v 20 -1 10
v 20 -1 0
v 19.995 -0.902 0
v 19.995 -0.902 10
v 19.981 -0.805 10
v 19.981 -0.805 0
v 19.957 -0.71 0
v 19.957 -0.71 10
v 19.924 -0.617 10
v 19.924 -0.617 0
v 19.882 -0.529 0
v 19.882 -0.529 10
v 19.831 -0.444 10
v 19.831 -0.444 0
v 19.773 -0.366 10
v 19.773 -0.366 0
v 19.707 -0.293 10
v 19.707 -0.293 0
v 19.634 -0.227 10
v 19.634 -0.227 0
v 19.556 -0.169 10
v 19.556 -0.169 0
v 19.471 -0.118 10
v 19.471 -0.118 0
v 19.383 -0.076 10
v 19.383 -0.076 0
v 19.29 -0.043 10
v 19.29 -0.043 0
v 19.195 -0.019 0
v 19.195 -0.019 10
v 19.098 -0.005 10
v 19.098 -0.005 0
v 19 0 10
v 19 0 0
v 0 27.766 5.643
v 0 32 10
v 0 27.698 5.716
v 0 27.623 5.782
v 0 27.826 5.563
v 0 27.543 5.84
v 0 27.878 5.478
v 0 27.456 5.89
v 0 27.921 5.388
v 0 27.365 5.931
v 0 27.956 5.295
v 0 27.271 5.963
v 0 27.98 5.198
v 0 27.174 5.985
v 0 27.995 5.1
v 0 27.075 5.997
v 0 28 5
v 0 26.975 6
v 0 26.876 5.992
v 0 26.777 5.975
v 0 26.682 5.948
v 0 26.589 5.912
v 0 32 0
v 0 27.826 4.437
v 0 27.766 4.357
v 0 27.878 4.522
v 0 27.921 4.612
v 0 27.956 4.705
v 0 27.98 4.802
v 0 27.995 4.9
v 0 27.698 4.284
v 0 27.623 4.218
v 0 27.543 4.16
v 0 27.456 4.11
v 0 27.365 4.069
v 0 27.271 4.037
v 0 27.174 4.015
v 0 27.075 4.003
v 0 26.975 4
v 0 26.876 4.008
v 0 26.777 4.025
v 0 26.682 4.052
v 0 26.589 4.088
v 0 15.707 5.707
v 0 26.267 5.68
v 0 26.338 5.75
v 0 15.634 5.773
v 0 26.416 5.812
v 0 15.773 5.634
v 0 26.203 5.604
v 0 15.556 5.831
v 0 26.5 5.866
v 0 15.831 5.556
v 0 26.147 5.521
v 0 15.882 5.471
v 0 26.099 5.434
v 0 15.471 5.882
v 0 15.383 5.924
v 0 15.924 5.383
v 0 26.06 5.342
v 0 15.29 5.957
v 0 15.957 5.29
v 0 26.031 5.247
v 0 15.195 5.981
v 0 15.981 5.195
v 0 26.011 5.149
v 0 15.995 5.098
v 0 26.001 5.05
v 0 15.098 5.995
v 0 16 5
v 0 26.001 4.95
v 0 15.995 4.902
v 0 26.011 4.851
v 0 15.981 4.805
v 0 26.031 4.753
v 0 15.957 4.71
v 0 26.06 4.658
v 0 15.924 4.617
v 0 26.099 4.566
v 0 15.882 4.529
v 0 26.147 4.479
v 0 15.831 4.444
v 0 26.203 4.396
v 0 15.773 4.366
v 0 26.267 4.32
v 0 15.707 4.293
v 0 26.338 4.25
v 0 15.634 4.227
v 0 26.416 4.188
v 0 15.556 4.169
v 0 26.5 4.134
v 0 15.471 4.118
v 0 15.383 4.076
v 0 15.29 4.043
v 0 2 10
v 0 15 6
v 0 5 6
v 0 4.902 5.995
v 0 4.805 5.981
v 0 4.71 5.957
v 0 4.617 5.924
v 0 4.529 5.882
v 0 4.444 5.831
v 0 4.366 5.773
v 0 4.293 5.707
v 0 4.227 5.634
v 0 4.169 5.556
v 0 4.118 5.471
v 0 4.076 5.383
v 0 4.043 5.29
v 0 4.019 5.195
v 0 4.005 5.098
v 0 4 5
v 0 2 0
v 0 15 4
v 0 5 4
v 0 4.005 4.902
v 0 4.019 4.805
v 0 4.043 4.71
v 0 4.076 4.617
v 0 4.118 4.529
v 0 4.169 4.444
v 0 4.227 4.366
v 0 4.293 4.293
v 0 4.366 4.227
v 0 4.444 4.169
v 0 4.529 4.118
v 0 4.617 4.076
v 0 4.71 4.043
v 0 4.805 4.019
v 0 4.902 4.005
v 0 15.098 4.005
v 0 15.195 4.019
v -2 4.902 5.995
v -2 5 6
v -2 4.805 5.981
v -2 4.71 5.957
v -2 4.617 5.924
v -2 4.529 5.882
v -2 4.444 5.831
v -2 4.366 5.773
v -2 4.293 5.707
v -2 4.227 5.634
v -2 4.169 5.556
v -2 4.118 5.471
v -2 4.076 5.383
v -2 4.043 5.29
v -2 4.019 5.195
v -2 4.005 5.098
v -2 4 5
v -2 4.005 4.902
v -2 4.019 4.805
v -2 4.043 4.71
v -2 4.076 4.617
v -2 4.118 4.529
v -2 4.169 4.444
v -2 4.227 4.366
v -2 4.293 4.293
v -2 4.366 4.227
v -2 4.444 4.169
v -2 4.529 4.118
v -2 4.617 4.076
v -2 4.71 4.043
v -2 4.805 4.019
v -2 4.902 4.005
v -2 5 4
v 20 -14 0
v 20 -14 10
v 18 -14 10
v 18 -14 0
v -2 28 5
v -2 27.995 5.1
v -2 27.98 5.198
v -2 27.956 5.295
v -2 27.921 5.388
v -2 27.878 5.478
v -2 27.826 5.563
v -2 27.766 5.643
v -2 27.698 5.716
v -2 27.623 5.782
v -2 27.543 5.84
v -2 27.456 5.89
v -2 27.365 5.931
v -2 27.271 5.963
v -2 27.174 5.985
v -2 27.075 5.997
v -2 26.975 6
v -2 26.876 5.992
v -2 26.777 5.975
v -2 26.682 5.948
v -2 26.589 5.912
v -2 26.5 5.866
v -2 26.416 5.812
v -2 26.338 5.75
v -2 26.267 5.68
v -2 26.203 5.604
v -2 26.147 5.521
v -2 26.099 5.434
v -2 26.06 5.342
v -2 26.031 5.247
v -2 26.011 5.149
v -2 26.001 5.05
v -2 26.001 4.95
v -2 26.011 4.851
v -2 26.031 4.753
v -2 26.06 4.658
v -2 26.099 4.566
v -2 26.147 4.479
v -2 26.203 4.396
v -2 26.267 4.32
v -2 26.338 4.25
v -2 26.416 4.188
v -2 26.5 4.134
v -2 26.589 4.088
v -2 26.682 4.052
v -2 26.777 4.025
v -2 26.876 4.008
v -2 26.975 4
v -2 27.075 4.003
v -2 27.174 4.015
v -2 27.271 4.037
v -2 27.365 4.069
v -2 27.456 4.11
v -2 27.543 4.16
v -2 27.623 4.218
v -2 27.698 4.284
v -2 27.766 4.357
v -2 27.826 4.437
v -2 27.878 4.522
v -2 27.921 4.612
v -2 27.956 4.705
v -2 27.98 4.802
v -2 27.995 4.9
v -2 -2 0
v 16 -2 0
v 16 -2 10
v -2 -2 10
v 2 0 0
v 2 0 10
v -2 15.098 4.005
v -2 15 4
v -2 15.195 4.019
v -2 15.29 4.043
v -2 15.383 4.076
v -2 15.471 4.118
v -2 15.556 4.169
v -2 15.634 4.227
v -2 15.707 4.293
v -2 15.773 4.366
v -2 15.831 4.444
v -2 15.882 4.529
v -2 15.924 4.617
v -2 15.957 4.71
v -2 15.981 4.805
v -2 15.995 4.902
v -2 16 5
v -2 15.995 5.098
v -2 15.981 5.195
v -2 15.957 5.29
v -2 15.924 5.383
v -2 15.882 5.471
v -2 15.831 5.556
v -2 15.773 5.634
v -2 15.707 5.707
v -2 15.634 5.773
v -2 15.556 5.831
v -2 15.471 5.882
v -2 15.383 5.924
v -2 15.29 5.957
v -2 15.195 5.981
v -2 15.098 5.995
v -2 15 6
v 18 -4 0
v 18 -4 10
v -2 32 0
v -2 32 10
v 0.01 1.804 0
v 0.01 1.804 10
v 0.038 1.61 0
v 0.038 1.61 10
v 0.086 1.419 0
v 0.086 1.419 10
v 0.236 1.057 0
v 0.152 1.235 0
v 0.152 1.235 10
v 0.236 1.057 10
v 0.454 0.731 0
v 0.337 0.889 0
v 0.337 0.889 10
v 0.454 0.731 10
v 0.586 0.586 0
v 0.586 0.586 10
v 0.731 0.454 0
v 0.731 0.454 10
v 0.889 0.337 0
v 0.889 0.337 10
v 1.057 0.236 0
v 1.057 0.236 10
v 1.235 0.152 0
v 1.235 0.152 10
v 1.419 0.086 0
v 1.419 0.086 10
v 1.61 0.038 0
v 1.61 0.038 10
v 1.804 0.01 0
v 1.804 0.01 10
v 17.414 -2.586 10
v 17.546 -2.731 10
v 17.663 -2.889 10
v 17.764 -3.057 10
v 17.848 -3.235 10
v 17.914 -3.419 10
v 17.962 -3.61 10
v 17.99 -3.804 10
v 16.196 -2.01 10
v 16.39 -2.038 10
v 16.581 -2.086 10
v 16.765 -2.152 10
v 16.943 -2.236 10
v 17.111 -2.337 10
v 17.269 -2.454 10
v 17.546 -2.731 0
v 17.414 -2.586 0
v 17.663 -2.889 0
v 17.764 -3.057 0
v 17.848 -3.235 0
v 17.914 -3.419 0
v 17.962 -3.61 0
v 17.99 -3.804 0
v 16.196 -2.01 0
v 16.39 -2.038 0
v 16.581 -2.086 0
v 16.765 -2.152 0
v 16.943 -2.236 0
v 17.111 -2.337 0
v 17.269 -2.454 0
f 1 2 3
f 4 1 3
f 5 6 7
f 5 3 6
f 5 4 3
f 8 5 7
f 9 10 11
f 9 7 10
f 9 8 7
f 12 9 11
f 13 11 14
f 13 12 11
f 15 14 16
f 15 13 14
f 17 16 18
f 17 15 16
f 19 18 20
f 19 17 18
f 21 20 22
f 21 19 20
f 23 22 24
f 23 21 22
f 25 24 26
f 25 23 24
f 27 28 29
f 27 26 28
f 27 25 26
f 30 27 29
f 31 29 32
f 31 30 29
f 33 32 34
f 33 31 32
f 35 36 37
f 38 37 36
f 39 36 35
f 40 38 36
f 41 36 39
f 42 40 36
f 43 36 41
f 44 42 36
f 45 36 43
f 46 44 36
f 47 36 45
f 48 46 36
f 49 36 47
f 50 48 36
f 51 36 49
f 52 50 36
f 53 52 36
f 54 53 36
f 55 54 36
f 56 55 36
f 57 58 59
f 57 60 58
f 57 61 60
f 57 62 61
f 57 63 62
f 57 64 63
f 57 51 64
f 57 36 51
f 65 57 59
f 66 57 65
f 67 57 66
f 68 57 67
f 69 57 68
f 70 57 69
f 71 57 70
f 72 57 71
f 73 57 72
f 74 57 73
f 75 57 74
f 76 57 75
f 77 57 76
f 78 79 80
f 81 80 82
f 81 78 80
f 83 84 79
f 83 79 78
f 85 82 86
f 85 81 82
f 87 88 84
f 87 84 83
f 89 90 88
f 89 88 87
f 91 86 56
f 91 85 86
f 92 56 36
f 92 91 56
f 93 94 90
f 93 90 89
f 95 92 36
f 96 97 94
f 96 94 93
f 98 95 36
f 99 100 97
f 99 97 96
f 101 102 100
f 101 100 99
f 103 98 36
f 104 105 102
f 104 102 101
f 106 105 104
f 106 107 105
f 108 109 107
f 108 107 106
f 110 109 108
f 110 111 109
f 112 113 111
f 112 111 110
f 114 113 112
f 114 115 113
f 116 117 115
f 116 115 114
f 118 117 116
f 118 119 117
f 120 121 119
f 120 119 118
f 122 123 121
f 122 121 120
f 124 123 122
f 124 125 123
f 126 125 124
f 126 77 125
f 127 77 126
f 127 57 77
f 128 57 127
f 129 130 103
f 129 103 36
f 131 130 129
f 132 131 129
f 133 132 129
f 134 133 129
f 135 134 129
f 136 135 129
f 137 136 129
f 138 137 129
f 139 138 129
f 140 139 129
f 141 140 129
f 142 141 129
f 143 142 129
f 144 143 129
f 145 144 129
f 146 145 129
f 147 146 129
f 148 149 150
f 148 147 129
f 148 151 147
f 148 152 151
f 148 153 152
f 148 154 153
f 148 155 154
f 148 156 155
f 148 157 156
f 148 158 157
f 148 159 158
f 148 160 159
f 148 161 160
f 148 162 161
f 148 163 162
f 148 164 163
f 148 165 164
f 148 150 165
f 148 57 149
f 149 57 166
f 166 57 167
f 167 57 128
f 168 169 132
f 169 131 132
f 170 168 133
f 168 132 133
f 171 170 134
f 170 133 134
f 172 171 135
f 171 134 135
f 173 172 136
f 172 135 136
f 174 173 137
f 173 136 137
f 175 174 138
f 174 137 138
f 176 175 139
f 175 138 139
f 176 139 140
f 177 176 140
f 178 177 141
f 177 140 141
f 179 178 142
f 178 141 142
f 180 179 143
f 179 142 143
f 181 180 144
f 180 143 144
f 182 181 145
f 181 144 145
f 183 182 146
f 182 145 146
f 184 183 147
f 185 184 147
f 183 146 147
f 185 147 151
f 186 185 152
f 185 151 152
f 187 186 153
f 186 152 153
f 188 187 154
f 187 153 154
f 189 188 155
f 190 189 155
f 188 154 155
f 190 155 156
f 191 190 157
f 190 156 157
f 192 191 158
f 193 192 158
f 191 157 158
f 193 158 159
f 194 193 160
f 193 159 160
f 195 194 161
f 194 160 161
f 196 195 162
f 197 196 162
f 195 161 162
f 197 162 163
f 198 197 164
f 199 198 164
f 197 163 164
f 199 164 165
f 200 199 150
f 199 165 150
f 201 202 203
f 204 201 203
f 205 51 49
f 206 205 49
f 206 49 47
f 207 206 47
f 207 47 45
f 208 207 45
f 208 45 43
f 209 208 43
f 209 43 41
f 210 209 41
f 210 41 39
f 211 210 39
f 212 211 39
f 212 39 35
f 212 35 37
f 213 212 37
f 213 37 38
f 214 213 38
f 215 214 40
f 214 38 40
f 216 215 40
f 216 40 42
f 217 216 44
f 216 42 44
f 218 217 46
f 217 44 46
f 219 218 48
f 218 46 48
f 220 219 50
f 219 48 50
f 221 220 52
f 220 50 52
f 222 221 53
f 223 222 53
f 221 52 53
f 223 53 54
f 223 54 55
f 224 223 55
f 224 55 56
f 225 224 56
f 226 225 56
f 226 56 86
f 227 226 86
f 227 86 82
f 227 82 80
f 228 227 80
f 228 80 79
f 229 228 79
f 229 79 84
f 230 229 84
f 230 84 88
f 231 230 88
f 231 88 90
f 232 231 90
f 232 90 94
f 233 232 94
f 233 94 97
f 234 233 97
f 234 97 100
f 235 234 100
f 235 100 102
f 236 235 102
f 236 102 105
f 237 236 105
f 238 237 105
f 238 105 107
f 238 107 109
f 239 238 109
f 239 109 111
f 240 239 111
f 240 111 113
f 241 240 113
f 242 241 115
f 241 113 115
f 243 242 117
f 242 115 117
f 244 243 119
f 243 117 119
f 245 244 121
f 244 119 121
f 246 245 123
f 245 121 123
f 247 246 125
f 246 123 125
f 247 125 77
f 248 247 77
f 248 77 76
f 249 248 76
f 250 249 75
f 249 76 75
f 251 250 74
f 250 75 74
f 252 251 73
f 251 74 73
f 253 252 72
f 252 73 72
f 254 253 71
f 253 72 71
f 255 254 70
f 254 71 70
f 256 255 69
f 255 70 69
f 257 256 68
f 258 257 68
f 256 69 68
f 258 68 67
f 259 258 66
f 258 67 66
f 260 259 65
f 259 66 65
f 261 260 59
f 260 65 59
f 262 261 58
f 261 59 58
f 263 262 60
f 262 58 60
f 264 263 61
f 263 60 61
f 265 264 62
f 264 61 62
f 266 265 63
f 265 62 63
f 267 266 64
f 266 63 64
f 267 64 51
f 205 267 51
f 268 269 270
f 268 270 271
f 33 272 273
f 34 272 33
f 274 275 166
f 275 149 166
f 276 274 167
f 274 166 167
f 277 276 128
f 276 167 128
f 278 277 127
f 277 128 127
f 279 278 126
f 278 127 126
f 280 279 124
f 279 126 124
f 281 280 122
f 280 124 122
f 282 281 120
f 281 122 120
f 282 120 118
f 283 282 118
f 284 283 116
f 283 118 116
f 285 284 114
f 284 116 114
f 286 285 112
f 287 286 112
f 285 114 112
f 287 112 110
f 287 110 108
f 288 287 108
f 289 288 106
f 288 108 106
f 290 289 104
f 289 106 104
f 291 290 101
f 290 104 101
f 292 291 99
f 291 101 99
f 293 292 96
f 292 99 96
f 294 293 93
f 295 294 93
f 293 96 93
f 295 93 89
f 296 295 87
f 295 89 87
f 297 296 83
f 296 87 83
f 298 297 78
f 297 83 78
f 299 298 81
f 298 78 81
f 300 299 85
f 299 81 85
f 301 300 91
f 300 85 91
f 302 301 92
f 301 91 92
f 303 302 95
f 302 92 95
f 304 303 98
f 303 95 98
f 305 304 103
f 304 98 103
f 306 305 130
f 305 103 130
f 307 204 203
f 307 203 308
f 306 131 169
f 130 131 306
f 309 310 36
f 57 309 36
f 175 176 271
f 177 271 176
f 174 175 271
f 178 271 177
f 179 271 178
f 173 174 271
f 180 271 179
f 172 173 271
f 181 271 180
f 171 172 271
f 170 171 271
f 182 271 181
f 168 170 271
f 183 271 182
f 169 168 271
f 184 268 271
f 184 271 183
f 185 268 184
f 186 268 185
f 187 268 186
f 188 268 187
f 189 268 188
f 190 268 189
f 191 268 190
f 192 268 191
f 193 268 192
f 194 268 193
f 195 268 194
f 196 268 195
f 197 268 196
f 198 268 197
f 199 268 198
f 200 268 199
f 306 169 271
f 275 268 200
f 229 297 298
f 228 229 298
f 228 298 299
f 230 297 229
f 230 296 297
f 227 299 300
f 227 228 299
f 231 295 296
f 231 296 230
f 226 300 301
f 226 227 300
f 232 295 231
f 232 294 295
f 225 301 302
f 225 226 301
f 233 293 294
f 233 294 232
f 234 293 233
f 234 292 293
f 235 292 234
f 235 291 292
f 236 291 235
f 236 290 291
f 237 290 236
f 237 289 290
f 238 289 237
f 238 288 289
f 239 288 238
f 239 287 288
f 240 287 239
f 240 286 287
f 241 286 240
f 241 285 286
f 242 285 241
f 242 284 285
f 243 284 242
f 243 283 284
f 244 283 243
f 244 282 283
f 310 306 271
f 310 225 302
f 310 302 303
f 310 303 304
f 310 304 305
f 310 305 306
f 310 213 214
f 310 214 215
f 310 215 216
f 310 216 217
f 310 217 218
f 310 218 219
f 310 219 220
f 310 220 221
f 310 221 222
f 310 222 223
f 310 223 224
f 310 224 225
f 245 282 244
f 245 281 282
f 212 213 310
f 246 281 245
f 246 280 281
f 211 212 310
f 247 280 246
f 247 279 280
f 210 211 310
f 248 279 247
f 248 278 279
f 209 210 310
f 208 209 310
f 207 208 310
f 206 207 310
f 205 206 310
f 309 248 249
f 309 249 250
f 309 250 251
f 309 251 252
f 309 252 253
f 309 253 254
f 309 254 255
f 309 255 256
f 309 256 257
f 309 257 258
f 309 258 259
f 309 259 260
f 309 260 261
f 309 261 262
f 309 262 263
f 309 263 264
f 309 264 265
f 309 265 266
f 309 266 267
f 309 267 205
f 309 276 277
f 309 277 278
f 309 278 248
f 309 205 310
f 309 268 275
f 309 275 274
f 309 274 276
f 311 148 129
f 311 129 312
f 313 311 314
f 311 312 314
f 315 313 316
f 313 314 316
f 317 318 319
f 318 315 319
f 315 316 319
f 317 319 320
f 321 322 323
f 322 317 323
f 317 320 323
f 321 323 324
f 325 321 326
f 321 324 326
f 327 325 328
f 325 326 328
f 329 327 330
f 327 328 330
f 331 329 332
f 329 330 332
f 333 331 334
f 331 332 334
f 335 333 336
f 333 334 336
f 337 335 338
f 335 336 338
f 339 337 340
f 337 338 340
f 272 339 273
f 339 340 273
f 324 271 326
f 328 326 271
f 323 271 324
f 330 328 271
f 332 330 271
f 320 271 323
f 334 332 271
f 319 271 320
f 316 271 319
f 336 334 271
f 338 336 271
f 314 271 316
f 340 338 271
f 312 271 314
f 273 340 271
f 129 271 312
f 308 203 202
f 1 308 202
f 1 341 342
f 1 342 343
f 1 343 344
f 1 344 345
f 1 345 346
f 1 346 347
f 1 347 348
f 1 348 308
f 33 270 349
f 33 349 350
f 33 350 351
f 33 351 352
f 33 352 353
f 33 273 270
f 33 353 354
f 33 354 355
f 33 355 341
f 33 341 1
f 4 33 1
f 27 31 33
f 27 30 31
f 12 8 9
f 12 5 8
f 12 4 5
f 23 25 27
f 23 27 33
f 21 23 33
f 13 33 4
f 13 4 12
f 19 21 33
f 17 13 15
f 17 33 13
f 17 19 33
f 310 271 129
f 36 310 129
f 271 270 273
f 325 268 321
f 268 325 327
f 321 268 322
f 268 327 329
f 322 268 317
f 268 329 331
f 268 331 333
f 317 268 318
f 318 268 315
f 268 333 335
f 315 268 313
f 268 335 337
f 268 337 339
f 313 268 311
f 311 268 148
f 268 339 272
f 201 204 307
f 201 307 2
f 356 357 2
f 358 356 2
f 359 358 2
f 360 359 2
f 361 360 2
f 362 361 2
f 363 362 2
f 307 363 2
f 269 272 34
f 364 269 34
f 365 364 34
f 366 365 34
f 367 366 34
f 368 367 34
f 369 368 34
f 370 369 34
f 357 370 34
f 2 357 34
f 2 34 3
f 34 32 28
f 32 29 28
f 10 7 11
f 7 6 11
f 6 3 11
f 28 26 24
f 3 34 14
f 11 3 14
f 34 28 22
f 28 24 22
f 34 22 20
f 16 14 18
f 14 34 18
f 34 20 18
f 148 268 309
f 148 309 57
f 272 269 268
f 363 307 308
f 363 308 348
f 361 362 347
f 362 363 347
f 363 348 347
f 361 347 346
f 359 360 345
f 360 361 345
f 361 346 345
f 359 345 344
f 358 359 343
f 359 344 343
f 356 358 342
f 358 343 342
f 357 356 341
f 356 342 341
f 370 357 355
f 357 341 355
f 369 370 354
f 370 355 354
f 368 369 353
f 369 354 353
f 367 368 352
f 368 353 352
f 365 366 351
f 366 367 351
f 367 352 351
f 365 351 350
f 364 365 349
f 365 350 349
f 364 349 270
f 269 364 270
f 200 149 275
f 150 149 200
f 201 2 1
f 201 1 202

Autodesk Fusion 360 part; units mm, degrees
sketch "Sketch2" plane through (0, 0, 0) normal (0, 0, 1) x (1, 0, 0)
  line L0 (0, 0) -> (-2, 0)
  line L1 (-2, 0) -> (-2, 32)
  line L2 (-2, 32) -> (0, 32)
  line L3 (0, 32) -> (0, 0)
  line L4 (-2, 0) -> (18, 0)
  line L5 (18, 0) -> (18, -2)
  line L6 (18, -2) -> (-2, -2)
  line L7 (-2, -2) -> (-2, 0)
  line L8 (18, 0) -> (20, 0)
  line L9 (20, 0) -> (20, -14)
  line L10 (20, -14) -> (18, -14)
  line L11 (18, -14) -> (18, 0)
  dimension "d5" = 2
  dimension "d6" = 32
  dimension "d7" = 20
  dimension "d8" = 2
  dimension "d9" = 2
  dimension "d10" = 14
extrude "Extrude1" add sketch "Sketch2" along normal blind 10
sketch "Sketch3" plane through (0, 0, 0) normal (1, 0, 0) x (0, 1, 0)
  line L0 (0, 0) -> (32, 0)
  line L1 (32, 0) -> (32, 10)
  line L2 (32, 10) -> (0, 10)
  line L3 (0, 10) -> (0, 0)
  circle A0 centre (27, 5) radius 1
  circle A1 centre (15, 5) radius 1
  circle A2 centre (5, 5) radius 1
  line L4 (5, 6) -> (15, 6)
  line L5 (15, 6) -> (15, 4)
  line L6 (15, 4) -> (5, 4)
  line L7 (5, 4) -> (5, 6)
  dimension "d15" = 2
  dimension "d16" = 5
  dimension "d17" = 5
  dimension "d18" = 2
  dimension "d19" = 15
  dimension "d20" = 2
  dimension "d21" = 5
  dimension "d22" = 5
  dimension "d23" = 5
  dimension "d24" = 2
extrude "Extrude2" cut sketch "Sketch3" against normal blind 2 contours A0 | A1 L5 | A1 L5 | A1 A2 L4 L6 | A2 L7 | A2 L7
fillet "Fillet1" radius 2 1 edges at (0, 0, 5)
fillet "Fillet1" radius 2 1 edges at (18, -2, 5)
fillet "Fillet1" radius 1 1 edges at (20, 0, 5)
equation "thickness = 2 mm"
equation "d5 = thickness"
equation "d7 = window_depth"
equation "d8 = thickness"
equation "d9 = thickness"
equation "width = 10 mm"
equation "d12 = width"
equation "hole = 2 mm"
equation "d15 = hole"
equation "d16 = width / 2"
equation "d17 = width / 2"
equation "d18 = hole"
equation "d19 = width + width / 2"
equation "d20 = hole"
equation "d21 = width / 2"
equation "d22 = width / 2"
equation "d23 = width / 2"
equation "d24 = hole"
equation "d25 = -thickness"
equation "d28 = thickness"
equation "d30 = thickness"
equation "d32 = thickness / 2"
equation "window_depth = 20 mm"
